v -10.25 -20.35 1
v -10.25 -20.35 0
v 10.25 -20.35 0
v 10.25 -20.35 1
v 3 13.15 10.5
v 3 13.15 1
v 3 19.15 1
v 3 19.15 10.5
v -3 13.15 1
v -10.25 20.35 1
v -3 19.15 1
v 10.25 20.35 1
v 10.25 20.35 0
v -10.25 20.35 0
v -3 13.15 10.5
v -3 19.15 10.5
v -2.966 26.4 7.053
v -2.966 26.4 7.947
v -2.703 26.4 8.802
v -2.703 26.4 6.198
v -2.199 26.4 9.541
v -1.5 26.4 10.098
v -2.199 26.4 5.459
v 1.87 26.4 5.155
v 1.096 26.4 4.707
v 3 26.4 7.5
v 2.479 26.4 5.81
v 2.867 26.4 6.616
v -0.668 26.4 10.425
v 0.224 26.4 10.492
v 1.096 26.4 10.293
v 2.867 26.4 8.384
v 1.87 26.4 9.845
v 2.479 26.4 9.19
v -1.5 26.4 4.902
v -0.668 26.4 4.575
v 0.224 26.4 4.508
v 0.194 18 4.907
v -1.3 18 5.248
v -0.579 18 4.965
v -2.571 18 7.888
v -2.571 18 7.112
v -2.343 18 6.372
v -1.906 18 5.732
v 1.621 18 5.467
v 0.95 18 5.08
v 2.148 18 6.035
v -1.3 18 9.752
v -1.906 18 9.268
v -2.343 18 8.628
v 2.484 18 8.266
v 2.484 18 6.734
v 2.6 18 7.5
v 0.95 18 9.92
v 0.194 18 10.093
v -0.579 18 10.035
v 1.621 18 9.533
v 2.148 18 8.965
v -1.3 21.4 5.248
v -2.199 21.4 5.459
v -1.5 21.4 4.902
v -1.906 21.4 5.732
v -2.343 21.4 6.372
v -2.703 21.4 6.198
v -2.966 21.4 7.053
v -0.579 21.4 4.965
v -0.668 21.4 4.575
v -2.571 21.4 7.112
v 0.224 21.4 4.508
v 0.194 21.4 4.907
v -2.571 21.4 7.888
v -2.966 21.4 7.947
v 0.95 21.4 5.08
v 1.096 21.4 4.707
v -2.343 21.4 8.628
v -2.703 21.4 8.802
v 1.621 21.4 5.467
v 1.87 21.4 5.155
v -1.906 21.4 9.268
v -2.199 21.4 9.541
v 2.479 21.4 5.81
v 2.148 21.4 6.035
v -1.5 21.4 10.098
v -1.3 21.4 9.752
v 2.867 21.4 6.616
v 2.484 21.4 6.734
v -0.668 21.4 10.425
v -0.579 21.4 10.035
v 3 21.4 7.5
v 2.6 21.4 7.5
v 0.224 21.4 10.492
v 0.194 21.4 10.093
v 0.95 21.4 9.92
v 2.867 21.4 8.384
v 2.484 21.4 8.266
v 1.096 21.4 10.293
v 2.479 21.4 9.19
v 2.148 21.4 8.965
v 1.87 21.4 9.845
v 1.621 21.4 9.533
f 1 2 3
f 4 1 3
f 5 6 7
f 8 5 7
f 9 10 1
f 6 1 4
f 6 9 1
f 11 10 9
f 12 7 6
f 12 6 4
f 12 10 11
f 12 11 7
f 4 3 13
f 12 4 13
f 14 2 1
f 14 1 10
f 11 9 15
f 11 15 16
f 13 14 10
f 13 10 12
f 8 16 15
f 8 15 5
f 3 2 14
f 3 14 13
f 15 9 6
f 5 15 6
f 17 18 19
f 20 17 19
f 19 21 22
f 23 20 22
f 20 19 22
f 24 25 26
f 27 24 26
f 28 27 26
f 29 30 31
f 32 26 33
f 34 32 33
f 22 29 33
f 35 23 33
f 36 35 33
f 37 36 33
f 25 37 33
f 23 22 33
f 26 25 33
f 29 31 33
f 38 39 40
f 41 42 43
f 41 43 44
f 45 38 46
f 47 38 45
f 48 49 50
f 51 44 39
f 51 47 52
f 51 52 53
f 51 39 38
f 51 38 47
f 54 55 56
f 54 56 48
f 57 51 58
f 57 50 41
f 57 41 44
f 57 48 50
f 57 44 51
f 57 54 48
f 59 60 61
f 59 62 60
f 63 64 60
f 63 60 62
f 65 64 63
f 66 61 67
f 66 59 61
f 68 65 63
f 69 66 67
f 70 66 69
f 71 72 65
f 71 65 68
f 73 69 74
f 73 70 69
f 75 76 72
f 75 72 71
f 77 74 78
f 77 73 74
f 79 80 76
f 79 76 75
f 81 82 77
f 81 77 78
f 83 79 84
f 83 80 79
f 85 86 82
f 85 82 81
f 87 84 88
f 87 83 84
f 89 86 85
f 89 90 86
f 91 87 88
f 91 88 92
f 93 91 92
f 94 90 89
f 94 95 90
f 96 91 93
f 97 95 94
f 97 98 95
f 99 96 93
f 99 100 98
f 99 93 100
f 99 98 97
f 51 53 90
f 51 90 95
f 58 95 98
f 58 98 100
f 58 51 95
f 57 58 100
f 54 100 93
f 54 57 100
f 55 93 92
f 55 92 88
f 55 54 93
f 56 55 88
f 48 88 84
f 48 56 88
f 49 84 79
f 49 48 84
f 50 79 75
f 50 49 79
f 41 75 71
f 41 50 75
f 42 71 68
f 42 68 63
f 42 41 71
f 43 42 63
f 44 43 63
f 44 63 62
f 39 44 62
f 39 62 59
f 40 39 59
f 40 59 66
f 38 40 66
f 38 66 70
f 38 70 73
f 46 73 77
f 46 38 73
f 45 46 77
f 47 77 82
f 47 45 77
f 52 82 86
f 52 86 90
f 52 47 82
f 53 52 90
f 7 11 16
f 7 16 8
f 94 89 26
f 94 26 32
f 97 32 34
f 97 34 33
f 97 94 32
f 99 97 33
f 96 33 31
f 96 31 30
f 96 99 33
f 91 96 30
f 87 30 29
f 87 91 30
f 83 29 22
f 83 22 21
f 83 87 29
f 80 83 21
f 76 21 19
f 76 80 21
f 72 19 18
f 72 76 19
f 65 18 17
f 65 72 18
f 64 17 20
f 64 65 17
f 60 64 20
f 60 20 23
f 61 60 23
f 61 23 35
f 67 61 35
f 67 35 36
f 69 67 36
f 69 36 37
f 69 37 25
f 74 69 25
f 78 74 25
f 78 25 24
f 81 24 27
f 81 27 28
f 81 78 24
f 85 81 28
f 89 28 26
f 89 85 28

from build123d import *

# Parameters (mm, degrees)
F0_W     = 20.5
F0_H     = 40.7
F0_W_2   = 6
F0_H_2   = 6
F1_DEPTH = 1
F2_DEPTH = 10.5
F4_START = -18
F3_R     = 2.6
F4_DEPTH = 3.4
F5_START = -21.4
F3_R_2   = 3
F5_DEPTH = 5


with BuildPart() as f1:
    # F0 (on Top) → F1 (new body)
    with BuildSketch(Plane.XY):
        Rectangle(F0_W, F0_H)
        with Locations((0, 16.15)):
            Rectangle(F0_W_2, F0_H_2, mode=Mode.SUBTRACT)
        with Locations((0, 16.15)):
            Rectangle(F0_W_2, F0_H_2)
    extrude(amount=F1_DEPTH)

    # F0 (on Top) → F2 (join)
    with BuildSketch(Plane.XY):
        with Locations((0, 16.15)):
            Rectangle(F0_W_2, F0_H_2)
    extrude(amount=F2_DEPTH)


with BuildPart() as f4:
    # F3 (on Front) → F4 (new body)
    with BuildSketch(Plane.XZ.offset(F4_START)):
        with Locations((0, 7.5)):
            Circle(F3_R)
    extrude(amount=-F4_DEPTH)

    # F3 (on Front) → F5 (join)
    with BuildSketch(Plane.XZ.offset(F5_START)):
        with Locations((0, 7.5)):
            Circle(F3_R_2)
        with Locations((0, 7.5)):
            Circle(F3_R, mode=Mode.SUBTRACT)
        with Locations((0, 7.5)):
            Circle(F3_R)
    extrude(amount=-F5_DEPTH)


solid = Compound([f1.part, f4.part])
